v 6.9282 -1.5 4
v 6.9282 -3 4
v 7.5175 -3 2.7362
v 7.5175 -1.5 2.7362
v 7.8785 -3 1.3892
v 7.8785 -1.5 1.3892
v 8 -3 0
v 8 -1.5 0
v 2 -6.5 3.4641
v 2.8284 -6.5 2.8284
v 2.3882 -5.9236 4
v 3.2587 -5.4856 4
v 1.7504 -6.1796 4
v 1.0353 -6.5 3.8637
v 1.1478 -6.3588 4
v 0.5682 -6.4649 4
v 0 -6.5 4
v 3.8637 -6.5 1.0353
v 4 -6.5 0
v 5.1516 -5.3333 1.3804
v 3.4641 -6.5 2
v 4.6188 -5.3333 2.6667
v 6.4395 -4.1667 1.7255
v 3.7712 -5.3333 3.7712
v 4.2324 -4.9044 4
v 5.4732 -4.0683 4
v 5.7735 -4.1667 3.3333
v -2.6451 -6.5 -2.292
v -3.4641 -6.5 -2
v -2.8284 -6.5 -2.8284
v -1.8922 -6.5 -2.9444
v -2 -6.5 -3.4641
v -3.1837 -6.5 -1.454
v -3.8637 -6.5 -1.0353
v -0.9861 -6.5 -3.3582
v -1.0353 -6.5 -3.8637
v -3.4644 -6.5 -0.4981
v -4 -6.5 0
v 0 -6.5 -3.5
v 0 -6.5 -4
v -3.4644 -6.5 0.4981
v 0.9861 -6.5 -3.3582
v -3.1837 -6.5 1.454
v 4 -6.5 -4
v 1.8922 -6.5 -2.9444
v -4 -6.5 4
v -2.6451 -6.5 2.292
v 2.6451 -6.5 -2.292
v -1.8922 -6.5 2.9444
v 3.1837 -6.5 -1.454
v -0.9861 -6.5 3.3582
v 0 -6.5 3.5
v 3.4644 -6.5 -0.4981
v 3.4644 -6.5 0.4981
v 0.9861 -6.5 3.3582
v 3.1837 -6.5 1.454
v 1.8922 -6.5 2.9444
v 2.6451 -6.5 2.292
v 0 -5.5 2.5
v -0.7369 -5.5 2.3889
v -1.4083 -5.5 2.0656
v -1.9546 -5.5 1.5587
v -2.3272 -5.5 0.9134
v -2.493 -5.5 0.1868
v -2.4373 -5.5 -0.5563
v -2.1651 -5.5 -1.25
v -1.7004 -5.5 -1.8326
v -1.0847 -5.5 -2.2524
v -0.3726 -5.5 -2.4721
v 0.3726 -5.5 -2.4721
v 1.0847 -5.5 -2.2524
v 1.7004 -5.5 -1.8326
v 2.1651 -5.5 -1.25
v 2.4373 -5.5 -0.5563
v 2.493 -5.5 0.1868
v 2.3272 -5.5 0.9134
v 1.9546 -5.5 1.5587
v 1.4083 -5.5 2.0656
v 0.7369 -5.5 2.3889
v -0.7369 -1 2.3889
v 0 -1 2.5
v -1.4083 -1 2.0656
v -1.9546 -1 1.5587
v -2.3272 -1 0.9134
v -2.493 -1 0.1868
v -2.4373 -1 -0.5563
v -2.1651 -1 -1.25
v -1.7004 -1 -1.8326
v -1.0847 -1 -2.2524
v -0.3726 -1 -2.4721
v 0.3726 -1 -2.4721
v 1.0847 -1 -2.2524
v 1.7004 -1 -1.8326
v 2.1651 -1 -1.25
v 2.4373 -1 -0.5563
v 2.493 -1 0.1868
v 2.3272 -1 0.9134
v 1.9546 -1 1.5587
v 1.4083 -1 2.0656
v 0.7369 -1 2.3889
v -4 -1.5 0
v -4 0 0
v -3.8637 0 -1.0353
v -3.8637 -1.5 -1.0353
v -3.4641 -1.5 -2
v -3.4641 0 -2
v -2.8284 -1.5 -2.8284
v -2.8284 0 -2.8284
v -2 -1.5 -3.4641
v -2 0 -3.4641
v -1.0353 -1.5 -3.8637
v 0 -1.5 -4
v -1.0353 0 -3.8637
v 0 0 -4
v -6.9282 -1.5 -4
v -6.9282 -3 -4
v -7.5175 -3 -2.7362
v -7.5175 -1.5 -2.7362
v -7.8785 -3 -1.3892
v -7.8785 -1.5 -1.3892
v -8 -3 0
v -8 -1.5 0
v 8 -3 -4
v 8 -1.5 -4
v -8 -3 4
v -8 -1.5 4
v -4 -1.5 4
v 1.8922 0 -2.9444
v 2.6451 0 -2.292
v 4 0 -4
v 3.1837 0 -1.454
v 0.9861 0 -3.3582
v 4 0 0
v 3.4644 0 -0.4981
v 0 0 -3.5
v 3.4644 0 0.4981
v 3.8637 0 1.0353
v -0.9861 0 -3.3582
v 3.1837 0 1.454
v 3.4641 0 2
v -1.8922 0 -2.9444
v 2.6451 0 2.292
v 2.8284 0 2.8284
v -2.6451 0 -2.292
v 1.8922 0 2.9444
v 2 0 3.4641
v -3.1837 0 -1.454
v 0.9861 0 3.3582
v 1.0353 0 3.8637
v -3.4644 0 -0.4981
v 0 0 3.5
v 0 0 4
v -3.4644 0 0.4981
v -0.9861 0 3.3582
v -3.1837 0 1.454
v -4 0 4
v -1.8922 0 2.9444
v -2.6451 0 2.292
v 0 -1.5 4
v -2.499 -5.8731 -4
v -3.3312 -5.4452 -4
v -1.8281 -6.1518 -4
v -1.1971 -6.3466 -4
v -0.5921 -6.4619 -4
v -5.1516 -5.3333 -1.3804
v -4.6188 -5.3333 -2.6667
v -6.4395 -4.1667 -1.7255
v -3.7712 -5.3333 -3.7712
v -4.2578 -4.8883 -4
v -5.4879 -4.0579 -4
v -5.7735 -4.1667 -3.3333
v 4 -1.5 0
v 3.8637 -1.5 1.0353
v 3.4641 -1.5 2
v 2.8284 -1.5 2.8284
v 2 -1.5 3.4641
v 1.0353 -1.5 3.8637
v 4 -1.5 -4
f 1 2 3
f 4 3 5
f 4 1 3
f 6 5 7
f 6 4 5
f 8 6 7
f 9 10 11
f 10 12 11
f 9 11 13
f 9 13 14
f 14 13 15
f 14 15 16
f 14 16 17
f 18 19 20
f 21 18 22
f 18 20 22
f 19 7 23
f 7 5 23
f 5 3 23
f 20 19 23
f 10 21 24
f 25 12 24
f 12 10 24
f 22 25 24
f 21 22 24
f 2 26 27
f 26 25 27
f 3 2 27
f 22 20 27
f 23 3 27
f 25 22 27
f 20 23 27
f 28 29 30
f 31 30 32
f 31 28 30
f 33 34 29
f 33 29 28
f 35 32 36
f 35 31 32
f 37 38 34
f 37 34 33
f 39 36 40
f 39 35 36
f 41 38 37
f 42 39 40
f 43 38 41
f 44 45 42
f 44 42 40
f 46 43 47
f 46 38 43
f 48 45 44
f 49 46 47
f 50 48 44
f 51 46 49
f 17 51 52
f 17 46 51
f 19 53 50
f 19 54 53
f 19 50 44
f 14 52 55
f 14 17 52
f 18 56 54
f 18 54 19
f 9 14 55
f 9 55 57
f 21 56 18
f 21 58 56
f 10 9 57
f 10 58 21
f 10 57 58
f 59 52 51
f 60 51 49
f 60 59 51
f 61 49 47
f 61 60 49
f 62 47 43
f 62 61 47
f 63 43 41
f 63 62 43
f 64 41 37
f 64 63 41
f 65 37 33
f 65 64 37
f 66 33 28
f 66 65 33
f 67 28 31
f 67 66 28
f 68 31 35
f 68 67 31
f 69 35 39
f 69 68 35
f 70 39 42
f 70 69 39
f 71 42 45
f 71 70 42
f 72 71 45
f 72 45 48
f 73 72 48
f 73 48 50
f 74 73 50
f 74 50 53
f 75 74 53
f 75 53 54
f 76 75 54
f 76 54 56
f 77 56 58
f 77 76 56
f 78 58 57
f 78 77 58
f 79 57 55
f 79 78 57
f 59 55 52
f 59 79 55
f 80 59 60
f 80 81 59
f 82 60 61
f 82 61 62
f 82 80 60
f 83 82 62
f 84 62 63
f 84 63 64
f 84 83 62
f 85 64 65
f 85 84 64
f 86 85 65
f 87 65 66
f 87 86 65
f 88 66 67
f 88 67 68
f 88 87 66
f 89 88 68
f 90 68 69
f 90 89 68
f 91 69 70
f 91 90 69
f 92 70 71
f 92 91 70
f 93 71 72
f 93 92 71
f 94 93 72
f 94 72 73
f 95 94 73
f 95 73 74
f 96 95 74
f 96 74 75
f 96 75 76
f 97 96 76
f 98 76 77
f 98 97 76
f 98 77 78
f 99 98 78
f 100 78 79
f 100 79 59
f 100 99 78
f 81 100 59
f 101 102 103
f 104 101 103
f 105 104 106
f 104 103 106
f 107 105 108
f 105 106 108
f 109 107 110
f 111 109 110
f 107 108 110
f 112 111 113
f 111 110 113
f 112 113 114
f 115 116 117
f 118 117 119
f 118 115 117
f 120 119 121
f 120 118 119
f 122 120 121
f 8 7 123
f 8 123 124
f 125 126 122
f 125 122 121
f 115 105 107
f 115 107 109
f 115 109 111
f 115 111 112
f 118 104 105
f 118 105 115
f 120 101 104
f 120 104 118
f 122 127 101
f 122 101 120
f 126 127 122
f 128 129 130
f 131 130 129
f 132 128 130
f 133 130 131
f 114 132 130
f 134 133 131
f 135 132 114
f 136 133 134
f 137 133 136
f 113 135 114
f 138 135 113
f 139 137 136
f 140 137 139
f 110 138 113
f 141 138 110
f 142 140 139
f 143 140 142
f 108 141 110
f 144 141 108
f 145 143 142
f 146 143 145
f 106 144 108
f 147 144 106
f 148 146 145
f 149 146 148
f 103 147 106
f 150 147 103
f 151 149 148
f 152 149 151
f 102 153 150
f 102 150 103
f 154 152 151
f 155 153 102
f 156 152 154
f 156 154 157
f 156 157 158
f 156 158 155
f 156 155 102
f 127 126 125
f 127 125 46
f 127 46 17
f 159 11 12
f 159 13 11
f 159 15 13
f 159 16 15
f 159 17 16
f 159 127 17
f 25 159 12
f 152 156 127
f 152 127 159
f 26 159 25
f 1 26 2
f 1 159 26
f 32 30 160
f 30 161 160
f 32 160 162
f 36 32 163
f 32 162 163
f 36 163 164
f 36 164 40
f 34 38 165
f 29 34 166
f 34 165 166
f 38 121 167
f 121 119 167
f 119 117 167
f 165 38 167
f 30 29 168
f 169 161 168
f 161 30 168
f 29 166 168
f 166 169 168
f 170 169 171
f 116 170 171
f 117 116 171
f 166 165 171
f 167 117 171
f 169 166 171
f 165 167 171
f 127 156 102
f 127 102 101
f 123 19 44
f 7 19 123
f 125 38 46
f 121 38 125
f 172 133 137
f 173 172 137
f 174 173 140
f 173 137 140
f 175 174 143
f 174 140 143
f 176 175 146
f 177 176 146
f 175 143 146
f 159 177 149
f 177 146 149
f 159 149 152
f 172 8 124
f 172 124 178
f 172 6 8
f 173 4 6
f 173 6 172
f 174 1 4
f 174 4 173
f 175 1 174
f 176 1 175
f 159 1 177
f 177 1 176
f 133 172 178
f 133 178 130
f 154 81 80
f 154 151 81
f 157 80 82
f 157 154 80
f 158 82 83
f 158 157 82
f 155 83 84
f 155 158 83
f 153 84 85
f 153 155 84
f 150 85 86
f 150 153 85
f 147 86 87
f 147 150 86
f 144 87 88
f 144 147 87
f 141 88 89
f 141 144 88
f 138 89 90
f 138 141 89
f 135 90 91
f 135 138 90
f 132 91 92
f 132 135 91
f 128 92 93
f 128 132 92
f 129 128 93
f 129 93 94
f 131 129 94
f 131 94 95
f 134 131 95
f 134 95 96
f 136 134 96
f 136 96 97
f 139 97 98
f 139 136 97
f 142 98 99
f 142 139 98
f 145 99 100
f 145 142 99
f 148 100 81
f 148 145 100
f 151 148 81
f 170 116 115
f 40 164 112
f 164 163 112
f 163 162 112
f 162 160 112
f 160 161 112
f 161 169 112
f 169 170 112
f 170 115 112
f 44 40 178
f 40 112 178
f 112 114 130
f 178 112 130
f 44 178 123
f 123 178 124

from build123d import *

# Parameters (mm, degrees)
EXTRUDE_1_DEPTH     = 4
CUT_EXTRUDE_1_DEPTH = 1.5
CUT_EXTRUDE_2_DEPTH = 6


with BuildPart() as part:
    # Эскиз1 → Бобышка-Вытянуть1 (new body, symmetric)
    with BuildSketch(Plane.XY):
        Polygon((4, 0), (-4, 0), (-4, -1.5), (-8, -1.5), (-8, -6.5), (8, -6.5), (8, -1.5), (4, -1.5), align=None)
    extrude(amount=EXTRUDE_1_DEPTH, both=True)

    # Эскиз3 → Отверстие обработанное метчиком M61 (revolve, cut)
    with BuildSketch(Plane(origin=(0, 0, 0), x_dir=(0, 0, 1), z_dir=(1, 0, 0))):
        Polygon((0, 0), (0, 6.5), (3.5, 6.5), (2.5, 5.5), (2.5, 1), (3.5, 0), align=None)
    revolve(axis=Axis((0, 6.35, 0), (0, -1, 0)), mode=Mode.SUBTRACT)

    # Эскиз4 → Вырез-Вытянуть1 (cut)
    with BuildSketch(Plane(origin=(0, 0, 0), x_dir=(1, 0, 0), z_dir=(0, 1, 0))):
        with BuildLine():
            Line((-4, 4), (-4, 0))
            ThreePointArc((-4, 0), (-2.828427125, 2.828427125), (0, 4))
            Line((0, 4), (-4, 4))
        make_face()
        with BuildLine():
            Line((0, -4), (4, -4))
            Line((4, -4), (4, 0))
            ThreePointArc((4, 0), (2.828427125, -2.828427125), (0, -4))
        make_face()
    extrude(amount=-CUT_EXTRUDE_1_DEPTH, mode=Mode.SUBTRACT)

    # Эскиз5 → Вырез-Вытянуть2 (cut, through all)
    with BuildSketch(Plane(origin=(0, -1.5, 0), x_dir=(1, 0, 0), z_dir=(0, 1, 0))):
        with BuildLine():
            Line((-8, 0), (-8, 4))
            Line((-8, 4), (-6.92820323, 4))
            ThreePointArc((-6.92820323, 4), (-7.72740661, 2.070552361), (-8, 0))
        make_face()
        with BuildLine():
            Line((8, 0), (8, -4))
            Line((8, -4), (6.92820323, -4))
            ThreePointArc((6.92820323, -4), (7.72740661, -2.070552361), (8, 0))
        make_face()
    extrude(amount=-CUT_EXTRUDE_2_DEPTH, mode=Mode.SUBTRACT)

    # Вырез-По траектории1: sweep along a path in Эскиз7
    with BuildLine(Plane.XZ.offset(6.5)) as sweep_1_path:
        Line((0, 8), (-8, 8))
        Line((-8, 8), (-8, 0))
        ThreePointArc((-8, 0), (-5.656854249, -5.656854249), (0, -8))
        Line((0, -8), (8, -8))
        Line((8, -8), (8, 0))
        ThreePointArc((8, 0), (5.656854249, 5.656854249), (0, 8))
    # Эскиз6 → Вырез-По траектории1 (sweep, cut)
    with BuildSketch(Plane.XY.offset(4)):
        Polygon((-8, -3), (-8, -6.5), (-4, -6.5), align=None)
    sweep(path=sweep_1_path.line, transition=Transition.RIGHT, mode=Mode.SUBTRACT)


solid = part.part
